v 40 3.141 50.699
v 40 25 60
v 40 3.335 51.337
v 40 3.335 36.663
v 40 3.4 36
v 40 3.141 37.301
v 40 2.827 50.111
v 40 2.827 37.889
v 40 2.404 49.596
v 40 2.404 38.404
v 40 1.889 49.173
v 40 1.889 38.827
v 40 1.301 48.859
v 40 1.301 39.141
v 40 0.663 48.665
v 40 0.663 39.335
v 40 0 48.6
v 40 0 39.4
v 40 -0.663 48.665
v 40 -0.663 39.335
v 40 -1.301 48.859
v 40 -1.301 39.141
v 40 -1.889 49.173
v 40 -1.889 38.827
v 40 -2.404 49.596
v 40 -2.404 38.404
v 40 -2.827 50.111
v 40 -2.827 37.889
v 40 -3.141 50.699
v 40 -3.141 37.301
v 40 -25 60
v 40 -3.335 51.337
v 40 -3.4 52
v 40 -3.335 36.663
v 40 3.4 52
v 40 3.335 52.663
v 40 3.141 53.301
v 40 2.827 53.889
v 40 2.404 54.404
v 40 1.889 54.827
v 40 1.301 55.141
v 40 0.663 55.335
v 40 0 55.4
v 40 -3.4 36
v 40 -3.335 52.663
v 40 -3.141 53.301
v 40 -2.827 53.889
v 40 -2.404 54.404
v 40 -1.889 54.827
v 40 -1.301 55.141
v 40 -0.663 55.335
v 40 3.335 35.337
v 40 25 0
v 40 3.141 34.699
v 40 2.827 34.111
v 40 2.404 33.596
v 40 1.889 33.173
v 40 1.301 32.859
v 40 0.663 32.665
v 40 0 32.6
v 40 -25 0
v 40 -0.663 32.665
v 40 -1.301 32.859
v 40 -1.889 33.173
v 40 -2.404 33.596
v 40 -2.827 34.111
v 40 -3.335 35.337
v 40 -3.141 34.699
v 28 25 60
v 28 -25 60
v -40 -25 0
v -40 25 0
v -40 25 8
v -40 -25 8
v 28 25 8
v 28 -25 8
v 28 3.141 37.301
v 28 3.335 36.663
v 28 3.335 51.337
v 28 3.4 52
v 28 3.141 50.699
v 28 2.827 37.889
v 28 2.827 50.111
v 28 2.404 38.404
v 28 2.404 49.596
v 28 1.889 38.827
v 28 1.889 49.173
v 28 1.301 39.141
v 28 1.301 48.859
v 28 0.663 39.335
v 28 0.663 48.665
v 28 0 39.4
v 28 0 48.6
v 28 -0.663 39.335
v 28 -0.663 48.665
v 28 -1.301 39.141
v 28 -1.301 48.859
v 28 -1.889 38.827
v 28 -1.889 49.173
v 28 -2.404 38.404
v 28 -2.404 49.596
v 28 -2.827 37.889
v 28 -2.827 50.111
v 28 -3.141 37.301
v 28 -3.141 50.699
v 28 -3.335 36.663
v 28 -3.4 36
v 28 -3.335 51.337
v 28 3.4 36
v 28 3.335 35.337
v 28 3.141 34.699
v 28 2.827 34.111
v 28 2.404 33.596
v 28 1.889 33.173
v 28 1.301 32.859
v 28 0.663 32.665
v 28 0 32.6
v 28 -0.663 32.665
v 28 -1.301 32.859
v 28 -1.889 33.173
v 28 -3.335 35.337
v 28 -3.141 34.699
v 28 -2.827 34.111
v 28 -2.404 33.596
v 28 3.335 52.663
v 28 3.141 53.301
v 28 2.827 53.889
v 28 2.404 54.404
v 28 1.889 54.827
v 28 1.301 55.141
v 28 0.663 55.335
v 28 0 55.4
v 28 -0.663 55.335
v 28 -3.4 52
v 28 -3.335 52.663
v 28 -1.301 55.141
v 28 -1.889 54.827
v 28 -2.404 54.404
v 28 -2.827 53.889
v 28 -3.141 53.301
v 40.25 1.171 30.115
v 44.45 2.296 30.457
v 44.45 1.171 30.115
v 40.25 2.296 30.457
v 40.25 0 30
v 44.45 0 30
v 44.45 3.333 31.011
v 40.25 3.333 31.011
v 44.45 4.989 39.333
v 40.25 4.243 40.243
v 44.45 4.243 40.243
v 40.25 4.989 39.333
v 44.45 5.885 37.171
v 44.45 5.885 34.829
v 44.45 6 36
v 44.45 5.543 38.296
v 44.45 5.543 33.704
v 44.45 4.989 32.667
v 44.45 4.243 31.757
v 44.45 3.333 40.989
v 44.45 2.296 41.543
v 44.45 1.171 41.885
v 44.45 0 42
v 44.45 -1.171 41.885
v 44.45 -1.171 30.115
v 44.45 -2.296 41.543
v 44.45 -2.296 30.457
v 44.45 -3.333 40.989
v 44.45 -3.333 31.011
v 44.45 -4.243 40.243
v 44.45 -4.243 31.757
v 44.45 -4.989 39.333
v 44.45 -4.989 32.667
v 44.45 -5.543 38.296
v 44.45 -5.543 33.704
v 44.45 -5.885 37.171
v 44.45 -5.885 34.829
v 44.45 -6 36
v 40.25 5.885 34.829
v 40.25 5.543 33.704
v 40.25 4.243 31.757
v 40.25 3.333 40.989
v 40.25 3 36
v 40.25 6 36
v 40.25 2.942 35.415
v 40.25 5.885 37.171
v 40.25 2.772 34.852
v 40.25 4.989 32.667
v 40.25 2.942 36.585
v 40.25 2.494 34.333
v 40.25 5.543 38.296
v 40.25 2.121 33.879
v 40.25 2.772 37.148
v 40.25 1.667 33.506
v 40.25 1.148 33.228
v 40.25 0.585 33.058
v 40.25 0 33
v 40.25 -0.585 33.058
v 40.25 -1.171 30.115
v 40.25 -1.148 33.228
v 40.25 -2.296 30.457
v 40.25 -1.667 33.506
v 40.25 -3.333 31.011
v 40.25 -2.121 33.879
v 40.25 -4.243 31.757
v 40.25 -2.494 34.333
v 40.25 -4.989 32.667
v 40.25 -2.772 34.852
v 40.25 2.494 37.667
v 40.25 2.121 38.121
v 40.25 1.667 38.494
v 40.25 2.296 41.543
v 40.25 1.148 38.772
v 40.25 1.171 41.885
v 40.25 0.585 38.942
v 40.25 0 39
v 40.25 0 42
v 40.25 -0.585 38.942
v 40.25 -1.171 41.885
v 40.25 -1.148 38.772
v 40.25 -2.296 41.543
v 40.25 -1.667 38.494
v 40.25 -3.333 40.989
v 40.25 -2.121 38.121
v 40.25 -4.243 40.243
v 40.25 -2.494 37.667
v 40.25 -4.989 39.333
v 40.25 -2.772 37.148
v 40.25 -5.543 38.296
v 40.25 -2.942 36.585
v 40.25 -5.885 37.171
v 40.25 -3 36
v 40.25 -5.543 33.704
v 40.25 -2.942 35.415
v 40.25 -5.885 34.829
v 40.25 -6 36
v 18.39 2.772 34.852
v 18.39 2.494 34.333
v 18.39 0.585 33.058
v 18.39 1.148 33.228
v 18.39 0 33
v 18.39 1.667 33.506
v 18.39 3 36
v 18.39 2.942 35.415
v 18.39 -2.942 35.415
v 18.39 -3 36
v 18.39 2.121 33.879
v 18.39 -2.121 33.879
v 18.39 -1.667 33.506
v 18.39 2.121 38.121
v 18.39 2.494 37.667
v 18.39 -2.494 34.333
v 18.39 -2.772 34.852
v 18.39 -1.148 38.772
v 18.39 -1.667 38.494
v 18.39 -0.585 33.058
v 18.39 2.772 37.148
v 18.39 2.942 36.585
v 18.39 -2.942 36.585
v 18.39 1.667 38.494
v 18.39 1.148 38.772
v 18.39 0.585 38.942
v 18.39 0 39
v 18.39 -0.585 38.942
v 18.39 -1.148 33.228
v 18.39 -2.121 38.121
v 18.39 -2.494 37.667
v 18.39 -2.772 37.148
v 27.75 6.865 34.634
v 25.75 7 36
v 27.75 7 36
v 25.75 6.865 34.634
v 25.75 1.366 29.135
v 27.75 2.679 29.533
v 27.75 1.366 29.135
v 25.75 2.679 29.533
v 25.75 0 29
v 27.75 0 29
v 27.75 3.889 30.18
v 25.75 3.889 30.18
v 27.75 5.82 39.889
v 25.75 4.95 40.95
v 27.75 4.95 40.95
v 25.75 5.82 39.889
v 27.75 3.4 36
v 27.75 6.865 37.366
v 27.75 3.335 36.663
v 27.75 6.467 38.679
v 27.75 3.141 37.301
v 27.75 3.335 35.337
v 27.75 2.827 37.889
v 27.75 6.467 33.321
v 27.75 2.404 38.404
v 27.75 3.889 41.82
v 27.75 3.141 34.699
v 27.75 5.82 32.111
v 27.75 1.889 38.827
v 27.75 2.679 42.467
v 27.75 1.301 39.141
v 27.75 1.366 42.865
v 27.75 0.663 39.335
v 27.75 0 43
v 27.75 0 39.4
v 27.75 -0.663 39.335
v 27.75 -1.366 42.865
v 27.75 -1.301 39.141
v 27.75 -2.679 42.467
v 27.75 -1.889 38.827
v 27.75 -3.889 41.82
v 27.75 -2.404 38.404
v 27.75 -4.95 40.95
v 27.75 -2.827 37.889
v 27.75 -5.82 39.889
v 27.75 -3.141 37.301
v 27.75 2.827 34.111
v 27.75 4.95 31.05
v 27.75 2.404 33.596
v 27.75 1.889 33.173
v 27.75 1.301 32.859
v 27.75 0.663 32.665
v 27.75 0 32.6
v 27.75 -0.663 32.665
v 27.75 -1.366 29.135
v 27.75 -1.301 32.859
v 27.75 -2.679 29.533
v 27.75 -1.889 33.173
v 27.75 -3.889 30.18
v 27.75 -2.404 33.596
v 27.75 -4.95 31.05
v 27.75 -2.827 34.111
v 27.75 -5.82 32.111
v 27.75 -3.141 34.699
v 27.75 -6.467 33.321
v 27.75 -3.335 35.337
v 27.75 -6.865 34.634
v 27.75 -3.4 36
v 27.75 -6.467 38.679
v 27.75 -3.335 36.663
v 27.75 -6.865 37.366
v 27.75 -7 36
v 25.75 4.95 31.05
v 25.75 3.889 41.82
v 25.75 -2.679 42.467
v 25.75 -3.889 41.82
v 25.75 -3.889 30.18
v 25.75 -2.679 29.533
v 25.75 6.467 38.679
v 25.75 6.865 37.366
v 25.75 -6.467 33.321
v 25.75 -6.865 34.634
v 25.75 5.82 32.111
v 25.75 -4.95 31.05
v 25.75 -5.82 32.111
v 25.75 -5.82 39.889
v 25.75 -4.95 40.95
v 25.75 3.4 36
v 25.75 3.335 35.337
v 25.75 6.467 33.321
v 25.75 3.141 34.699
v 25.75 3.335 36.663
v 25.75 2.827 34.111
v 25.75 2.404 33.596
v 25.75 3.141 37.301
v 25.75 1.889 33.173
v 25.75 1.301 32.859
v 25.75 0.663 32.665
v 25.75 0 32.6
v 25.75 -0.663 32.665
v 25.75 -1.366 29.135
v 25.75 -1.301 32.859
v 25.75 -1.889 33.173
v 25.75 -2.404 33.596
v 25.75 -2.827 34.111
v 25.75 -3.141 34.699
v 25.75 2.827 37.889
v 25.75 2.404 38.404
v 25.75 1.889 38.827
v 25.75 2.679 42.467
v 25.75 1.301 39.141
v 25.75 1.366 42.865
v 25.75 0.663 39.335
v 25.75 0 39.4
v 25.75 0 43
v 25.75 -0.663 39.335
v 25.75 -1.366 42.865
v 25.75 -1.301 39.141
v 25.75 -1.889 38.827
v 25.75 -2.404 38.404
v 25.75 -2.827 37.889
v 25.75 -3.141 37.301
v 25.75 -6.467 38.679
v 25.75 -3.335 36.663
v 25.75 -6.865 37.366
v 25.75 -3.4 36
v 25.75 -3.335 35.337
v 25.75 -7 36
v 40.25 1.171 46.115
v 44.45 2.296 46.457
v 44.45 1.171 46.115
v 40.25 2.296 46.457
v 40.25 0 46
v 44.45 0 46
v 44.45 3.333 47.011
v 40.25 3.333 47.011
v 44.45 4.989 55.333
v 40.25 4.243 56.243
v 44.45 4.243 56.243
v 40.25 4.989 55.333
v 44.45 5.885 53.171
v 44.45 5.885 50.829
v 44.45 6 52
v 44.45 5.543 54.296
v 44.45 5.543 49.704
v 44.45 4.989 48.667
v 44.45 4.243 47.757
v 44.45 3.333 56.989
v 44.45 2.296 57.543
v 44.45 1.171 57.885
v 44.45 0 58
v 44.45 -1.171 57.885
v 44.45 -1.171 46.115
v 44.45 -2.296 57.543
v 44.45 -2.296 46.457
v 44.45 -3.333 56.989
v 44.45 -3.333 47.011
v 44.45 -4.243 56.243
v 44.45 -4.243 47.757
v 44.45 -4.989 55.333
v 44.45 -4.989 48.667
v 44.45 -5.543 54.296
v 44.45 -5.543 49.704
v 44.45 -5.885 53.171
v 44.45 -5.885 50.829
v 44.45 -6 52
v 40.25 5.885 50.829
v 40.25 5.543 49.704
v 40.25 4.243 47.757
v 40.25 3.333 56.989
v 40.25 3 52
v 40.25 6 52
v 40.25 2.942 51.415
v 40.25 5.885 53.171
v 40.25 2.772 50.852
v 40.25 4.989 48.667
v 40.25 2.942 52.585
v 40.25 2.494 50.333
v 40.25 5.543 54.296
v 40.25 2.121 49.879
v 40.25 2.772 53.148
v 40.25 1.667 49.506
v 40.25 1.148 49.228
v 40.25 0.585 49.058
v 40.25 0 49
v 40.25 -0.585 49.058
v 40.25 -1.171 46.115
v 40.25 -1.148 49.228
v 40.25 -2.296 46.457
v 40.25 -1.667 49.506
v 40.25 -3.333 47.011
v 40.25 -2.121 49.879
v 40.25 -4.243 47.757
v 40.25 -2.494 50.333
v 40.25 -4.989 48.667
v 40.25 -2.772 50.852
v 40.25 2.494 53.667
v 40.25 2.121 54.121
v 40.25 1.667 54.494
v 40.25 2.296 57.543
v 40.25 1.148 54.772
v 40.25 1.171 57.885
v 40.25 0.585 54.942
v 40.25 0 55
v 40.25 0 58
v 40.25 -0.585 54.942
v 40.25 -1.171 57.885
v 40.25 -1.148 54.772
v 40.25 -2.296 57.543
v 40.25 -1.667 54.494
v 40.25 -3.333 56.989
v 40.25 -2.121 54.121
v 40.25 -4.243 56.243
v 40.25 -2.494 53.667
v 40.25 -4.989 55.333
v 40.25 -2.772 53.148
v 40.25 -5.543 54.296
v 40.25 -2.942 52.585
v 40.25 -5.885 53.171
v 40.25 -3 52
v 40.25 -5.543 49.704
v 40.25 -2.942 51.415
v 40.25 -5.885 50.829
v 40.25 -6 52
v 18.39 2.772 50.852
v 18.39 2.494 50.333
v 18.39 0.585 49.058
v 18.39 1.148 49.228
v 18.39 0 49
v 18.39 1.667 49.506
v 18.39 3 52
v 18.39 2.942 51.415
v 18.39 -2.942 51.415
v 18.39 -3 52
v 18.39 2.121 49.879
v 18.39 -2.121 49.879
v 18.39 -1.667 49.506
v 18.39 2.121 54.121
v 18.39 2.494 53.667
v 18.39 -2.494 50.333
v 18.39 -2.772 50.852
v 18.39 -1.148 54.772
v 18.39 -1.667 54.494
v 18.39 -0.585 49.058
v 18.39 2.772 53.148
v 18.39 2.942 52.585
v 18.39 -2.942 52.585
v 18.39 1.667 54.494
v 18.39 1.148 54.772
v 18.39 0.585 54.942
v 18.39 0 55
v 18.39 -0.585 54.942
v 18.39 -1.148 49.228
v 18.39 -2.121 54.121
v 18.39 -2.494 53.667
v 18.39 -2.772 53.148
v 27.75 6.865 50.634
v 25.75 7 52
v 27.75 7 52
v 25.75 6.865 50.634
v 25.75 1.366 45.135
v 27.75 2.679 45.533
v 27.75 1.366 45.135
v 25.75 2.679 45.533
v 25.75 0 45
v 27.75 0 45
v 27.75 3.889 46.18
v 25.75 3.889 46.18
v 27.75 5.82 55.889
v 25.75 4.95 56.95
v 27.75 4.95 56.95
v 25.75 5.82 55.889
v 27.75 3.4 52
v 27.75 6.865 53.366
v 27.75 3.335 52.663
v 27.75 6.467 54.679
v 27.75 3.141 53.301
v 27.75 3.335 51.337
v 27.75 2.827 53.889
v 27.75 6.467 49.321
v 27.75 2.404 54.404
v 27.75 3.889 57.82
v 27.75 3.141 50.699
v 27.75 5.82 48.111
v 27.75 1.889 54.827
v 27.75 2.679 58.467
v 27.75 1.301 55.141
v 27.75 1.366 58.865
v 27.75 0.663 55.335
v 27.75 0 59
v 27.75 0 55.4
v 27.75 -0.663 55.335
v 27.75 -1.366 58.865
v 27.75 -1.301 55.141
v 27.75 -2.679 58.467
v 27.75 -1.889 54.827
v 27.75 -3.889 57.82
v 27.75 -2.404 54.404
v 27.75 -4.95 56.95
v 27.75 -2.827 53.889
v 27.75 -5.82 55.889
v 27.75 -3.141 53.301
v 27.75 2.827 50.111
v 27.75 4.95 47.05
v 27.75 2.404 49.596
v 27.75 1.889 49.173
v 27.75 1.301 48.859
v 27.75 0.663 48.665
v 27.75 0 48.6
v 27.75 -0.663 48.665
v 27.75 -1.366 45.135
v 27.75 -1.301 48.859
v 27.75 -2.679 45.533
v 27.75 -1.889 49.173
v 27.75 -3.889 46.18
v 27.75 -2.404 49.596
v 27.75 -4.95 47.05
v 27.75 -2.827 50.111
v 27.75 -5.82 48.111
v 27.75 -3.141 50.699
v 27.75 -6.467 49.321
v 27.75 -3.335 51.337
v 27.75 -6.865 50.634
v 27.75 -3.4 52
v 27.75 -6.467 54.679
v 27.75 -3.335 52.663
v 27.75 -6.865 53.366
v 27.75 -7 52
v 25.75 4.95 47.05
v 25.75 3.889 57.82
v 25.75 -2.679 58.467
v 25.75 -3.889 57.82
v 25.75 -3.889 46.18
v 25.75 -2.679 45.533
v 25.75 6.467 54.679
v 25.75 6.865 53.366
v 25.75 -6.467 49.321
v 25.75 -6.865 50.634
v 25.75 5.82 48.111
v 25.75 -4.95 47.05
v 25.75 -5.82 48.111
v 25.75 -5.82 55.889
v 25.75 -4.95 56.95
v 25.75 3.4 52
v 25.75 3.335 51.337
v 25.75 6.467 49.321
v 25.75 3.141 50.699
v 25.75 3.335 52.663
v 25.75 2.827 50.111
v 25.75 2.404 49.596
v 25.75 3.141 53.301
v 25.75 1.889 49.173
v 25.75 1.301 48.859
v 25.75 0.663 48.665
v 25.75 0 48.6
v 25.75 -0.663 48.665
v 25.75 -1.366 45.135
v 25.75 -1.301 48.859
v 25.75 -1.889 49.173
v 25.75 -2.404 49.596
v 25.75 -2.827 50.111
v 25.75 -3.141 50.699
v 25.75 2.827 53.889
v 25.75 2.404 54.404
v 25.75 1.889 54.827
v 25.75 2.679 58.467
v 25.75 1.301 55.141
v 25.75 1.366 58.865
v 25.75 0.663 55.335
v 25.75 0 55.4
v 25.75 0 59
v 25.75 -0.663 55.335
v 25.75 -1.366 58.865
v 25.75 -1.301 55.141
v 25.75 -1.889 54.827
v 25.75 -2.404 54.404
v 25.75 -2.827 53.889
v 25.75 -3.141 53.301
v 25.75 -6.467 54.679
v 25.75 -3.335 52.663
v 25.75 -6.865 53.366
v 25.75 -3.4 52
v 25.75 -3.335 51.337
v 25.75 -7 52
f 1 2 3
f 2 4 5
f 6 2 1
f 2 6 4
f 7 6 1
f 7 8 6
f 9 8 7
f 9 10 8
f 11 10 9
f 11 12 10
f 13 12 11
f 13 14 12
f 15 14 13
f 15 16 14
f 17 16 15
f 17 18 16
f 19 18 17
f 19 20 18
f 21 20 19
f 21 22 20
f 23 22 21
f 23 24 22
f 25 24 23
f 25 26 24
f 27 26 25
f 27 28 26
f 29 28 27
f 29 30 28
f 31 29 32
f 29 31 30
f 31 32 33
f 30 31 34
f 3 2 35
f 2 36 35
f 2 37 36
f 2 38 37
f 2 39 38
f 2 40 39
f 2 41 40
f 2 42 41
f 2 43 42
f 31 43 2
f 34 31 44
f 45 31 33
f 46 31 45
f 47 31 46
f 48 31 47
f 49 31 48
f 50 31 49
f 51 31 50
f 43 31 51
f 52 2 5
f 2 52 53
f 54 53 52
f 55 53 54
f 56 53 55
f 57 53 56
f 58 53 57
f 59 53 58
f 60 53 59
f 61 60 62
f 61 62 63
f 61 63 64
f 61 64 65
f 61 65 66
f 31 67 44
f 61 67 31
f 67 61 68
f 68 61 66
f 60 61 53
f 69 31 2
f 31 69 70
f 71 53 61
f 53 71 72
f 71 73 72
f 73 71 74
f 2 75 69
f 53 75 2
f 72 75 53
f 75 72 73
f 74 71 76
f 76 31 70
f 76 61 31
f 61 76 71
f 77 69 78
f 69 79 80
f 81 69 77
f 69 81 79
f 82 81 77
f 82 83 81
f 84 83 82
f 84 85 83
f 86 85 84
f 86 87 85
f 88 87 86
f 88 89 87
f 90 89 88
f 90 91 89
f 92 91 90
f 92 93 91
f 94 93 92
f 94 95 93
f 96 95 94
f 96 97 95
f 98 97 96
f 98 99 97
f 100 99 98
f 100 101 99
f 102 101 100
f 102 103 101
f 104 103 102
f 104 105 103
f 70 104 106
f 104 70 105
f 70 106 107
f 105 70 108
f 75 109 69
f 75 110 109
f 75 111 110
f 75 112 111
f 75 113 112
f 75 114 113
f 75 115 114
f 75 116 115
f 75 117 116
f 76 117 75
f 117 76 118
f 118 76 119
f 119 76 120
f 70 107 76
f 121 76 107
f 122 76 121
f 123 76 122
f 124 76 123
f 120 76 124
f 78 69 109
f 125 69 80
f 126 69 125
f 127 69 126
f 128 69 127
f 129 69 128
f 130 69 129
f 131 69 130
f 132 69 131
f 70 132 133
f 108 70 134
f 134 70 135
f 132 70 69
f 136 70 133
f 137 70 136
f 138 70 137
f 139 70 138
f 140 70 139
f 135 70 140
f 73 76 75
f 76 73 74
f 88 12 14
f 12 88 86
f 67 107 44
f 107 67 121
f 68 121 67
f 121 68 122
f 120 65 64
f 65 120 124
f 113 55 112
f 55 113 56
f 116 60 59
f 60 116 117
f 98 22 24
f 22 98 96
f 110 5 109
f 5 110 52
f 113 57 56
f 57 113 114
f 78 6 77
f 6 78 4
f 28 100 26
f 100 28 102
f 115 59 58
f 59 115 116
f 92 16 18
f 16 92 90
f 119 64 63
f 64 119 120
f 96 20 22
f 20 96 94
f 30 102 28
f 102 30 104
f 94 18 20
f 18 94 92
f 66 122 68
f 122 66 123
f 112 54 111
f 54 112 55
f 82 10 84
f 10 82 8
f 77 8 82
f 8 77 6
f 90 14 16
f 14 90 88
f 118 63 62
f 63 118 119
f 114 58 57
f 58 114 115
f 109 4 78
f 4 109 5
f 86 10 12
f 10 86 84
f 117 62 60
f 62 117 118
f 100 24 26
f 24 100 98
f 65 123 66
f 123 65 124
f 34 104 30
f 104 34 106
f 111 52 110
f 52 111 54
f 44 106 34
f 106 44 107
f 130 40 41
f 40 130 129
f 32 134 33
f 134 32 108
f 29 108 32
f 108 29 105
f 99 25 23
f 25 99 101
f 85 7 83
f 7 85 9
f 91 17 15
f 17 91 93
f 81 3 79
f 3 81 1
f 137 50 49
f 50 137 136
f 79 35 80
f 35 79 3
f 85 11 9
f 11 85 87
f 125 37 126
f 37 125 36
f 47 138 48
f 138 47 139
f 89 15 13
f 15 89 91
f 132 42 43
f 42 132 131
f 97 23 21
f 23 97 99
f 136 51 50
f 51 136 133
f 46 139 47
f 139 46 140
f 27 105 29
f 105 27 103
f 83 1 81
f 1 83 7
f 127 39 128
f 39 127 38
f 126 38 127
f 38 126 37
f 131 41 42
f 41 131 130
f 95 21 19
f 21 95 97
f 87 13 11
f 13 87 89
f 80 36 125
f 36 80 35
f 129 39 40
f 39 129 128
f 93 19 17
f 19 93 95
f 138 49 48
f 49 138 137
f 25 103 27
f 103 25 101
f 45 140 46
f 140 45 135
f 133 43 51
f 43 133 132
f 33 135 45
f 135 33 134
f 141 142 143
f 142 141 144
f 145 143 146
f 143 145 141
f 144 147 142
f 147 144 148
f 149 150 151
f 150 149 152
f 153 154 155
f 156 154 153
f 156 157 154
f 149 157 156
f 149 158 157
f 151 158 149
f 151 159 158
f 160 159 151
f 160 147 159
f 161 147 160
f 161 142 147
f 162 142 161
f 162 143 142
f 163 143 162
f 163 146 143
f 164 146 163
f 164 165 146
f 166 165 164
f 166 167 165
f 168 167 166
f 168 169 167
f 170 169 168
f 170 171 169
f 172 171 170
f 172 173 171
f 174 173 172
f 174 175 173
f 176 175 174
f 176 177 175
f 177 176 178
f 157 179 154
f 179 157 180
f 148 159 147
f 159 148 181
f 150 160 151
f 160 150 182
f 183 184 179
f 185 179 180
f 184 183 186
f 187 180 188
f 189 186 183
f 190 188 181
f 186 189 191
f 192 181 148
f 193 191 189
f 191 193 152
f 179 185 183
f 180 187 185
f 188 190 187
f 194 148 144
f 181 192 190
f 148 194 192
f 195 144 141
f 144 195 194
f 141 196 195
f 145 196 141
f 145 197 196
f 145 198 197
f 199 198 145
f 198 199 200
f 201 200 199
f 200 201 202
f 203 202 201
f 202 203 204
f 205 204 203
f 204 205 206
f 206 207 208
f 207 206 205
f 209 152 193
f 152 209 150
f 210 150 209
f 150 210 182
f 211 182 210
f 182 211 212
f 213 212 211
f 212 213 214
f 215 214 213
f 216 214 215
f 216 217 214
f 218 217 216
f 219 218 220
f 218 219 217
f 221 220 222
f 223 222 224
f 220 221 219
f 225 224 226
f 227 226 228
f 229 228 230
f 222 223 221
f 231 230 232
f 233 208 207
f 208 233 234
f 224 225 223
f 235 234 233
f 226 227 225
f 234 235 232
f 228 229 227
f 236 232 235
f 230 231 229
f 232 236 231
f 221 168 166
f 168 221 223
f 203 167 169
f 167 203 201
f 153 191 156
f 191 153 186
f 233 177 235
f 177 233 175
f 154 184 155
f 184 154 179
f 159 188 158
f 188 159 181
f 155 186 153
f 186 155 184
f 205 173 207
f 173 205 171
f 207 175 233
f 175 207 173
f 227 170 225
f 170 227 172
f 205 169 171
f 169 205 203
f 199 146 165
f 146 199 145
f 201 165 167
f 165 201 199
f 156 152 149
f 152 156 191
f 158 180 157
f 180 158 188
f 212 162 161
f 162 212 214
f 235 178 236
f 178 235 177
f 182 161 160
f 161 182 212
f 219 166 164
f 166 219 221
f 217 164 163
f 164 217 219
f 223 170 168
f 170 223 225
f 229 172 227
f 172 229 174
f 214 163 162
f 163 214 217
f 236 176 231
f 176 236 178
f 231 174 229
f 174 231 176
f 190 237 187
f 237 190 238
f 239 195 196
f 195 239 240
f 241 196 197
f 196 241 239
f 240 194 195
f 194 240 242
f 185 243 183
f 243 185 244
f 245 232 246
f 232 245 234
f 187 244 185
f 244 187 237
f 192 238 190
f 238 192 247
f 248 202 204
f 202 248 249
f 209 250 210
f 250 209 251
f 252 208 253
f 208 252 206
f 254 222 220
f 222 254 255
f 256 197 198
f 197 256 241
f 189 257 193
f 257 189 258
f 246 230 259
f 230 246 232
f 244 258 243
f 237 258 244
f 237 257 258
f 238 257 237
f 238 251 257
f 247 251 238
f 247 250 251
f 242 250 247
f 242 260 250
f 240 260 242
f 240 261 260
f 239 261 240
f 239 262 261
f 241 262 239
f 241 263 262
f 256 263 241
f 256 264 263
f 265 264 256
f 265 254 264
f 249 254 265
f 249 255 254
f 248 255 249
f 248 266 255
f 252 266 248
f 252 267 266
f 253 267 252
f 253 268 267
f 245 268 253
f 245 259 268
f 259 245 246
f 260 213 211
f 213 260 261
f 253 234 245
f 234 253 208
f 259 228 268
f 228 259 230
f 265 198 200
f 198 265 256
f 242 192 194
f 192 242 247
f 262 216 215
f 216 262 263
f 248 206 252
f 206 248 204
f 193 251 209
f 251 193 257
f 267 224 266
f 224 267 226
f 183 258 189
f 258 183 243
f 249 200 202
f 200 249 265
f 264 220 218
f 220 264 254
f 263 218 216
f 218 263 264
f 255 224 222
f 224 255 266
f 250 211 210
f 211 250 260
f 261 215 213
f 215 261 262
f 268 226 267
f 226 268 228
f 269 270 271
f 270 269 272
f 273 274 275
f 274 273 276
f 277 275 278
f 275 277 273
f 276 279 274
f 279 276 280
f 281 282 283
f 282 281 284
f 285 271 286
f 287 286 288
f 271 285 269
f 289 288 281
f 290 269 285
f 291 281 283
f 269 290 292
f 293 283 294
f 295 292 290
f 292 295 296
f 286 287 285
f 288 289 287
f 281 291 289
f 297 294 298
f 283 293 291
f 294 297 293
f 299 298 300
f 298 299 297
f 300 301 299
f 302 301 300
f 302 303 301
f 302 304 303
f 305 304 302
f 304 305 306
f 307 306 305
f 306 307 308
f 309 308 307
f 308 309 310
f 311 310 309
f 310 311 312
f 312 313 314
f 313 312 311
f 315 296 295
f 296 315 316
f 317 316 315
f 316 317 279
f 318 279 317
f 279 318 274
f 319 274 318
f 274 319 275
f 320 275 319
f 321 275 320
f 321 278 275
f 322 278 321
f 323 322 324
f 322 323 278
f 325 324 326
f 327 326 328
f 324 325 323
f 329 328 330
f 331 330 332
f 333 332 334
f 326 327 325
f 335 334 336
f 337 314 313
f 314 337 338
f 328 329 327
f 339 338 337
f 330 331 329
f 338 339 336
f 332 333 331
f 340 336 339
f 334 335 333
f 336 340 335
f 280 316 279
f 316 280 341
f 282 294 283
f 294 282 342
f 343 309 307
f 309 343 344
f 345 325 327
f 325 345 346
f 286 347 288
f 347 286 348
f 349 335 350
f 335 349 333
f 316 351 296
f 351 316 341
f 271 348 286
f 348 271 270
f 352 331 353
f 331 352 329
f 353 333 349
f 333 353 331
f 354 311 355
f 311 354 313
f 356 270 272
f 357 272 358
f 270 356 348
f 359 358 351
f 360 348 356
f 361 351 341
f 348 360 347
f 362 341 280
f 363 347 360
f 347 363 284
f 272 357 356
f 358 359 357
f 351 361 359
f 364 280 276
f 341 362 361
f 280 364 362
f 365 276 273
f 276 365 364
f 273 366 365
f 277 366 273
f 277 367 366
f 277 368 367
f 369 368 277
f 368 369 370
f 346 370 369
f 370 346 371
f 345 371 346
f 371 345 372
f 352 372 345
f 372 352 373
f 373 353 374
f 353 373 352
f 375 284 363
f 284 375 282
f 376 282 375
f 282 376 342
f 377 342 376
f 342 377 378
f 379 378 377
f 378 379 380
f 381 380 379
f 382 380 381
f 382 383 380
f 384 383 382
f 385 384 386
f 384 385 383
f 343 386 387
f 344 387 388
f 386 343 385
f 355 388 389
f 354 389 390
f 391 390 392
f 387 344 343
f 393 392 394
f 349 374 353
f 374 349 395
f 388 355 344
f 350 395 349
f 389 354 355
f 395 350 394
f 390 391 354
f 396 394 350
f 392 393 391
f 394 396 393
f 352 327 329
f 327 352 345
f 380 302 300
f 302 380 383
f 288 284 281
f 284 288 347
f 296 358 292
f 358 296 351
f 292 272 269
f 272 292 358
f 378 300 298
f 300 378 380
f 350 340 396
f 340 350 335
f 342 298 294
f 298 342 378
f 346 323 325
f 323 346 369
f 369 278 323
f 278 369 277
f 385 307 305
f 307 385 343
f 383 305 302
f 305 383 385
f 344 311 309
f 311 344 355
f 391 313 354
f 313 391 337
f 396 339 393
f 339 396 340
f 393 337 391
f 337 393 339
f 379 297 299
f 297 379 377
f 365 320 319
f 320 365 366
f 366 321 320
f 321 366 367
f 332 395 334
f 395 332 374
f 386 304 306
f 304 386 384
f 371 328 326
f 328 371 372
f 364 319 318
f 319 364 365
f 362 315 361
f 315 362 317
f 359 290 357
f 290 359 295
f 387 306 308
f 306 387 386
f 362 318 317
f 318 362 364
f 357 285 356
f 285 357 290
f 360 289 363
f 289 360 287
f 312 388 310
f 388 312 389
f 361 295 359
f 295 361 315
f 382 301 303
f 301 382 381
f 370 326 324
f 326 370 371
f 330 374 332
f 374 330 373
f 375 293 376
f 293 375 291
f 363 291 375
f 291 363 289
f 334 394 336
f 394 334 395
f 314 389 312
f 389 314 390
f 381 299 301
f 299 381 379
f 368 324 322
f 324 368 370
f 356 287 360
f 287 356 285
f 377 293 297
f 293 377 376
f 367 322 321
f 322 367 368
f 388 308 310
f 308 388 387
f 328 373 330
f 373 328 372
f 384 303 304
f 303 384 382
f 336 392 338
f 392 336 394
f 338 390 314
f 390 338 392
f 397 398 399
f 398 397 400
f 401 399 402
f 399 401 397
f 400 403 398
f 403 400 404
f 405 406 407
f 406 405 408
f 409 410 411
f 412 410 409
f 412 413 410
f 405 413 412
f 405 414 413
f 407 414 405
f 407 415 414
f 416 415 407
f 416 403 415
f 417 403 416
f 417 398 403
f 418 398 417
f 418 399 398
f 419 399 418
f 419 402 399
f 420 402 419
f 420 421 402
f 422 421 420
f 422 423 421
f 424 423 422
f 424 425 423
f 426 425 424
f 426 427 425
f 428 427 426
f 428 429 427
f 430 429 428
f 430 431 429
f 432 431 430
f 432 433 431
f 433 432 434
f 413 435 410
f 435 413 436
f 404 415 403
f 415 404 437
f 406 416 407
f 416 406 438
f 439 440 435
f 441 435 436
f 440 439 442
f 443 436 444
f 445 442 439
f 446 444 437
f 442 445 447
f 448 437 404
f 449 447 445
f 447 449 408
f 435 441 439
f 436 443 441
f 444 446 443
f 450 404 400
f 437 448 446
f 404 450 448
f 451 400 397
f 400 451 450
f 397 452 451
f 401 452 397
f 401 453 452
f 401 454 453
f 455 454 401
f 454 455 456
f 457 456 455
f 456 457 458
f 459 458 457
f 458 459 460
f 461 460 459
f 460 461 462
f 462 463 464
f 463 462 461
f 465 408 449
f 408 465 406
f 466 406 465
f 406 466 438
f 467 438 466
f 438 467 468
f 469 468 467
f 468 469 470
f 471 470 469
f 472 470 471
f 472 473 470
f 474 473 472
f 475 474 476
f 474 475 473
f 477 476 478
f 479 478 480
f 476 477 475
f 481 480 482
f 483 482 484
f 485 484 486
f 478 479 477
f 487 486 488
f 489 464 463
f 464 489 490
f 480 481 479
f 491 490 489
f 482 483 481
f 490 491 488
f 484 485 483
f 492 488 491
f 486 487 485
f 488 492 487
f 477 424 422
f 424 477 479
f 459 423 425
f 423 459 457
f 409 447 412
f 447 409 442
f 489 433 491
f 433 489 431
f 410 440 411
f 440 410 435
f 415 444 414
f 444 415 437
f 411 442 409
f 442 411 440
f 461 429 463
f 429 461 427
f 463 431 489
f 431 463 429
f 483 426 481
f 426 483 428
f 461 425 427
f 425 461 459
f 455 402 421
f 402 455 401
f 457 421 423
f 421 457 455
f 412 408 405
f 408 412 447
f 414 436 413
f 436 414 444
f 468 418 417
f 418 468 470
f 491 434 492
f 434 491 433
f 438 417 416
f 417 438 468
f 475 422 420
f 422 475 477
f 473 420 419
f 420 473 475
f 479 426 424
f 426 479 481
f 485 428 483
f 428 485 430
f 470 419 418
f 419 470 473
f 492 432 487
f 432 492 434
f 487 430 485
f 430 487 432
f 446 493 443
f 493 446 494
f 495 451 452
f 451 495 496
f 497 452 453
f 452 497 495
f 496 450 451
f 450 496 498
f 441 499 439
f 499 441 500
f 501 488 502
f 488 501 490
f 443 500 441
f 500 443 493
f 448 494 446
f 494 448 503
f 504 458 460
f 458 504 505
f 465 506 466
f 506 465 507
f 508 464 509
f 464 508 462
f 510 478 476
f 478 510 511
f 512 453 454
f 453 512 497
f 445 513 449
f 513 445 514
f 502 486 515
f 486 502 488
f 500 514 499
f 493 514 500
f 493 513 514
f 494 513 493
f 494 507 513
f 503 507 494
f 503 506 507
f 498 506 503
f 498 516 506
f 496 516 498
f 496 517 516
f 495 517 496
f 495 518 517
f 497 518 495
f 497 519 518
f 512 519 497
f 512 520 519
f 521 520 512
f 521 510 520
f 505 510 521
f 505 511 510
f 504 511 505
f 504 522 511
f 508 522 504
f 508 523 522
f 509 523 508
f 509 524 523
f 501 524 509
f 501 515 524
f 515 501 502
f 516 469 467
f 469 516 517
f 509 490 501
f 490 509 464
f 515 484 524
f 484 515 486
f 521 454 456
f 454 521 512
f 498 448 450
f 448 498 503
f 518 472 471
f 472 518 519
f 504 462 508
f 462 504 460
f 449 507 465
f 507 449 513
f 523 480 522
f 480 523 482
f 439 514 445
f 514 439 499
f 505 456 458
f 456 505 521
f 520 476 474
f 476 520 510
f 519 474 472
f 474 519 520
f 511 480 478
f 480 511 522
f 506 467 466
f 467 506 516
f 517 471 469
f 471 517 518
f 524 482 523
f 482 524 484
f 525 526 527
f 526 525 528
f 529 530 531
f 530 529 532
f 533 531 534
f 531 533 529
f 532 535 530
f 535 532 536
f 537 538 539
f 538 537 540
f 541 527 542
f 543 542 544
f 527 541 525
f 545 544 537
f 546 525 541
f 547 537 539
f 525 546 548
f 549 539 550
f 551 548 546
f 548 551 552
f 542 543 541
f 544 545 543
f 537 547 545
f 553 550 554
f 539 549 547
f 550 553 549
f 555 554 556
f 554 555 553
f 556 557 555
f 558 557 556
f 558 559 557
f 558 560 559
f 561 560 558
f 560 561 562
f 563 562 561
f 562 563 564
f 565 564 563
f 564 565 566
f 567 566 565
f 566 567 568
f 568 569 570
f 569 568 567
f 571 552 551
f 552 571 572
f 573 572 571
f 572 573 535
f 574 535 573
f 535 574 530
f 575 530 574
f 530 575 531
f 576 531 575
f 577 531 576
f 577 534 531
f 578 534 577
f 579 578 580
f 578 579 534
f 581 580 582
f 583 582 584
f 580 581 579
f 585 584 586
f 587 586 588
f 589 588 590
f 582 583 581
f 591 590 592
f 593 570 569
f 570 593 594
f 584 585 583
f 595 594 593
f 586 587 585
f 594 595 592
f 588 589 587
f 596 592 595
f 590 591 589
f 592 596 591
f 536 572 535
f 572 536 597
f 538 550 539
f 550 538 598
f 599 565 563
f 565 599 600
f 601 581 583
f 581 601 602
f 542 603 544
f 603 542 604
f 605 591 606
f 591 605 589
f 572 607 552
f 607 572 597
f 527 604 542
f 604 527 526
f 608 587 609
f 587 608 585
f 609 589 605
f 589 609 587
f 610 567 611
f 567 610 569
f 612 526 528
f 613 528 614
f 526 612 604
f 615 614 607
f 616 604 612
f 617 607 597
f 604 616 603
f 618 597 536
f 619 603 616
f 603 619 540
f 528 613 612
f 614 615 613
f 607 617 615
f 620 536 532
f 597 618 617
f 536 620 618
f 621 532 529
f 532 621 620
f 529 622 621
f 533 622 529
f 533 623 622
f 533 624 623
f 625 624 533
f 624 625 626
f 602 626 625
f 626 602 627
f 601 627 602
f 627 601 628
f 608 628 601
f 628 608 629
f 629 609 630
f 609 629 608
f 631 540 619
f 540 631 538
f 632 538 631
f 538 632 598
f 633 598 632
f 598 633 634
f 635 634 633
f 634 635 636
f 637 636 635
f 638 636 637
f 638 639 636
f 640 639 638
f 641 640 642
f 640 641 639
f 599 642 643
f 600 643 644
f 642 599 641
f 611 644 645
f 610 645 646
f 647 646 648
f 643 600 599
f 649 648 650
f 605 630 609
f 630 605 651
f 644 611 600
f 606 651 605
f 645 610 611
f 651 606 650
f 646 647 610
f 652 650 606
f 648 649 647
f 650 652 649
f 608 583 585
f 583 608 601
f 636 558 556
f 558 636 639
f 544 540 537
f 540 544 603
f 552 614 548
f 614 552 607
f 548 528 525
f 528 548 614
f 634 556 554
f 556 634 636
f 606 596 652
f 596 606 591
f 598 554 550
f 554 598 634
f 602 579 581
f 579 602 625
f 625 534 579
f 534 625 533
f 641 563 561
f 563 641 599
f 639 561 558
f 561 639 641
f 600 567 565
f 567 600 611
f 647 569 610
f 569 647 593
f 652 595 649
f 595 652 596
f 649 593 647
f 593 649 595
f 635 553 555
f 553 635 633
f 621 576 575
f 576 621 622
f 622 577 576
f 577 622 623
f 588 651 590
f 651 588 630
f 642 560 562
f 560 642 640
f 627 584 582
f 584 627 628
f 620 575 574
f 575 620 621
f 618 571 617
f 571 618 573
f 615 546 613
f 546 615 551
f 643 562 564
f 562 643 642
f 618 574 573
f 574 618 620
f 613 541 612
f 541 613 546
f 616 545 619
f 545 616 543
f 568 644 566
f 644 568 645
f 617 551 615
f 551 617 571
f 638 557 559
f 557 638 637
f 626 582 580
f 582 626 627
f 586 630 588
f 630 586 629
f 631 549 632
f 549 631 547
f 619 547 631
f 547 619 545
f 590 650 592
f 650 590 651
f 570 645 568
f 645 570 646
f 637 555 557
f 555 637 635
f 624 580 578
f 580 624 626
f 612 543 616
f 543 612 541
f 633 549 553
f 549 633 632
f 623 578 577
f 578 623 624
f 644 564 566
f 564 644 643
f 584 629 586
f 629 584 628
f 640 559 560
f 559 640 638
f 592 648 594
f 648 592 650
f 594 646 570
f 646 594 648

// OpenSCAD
$fn = 32;

// ------------------------------------------------------------------------
// Bolted bracket: 80 x 50 mm bracket with 2 bolt joints
// Every part is its own module, assembly() places them once.
// ------------------------------------------------------------------------

// --- part 1 ---
module bracket() {
  difference() {
    translate([-40, -25, 0]) cube([80, 50, 60]);
    translate([-41, -26, 8]) cube([69, 52, 53]);
    translate([34, 0, 36]) rotate([0, 90, 0]) cylinder(h = 14, d = 6.8, center = true);
    translate([34, 0, 52]) rotate([0, 90, 0]) cylinder(h = 14, d = 6.8, center = true);
  }
}

// --- part 2 ---
module bolt1() {
  cylinder(h = 4.2, d = 12);
  translate([0, 0, -21.86]) cylinder(h = 21.86, d = 6);
}

// --- part 3 ---
module washer1() {
  difference() {
      translate([0, 0, 0]) cylinder(h = 2, d = 14);
      translate([0, 0, -1]) cylinder(h = 4, d = 6.8);
    }
}

// --- part 4 ---
module bolt2() {
  cylinder(h = 4.2, d = 12);
  translate([0, 0, -21.86]) cylinder(h = 21.86, d = 6);
}

// --- part 5 ---
module washer2() {
  difference() {
      translate([0, 0, 0]) cylinder(h = 2, d = 14);
      translate([0, 0, -1]) cylinder(h = 4, d = 6.8);
    }
}

// --- assembly ---
module assembly() {
  translate([0, 0, 0]) rotate([0, 0, 0]) bracket();
  translate([40.25, 0, 36]) rotate([0, 90, 0]) bolt1();
  translate([25.75, 0, 36]) rotate([0, 90, 0]) washer1();
  translate([40.25, 0, 52]) rotate([0, 90, 0]) bolt2();
  translate([25.75, 0, 52]) rotate([0, 90, 0]) washer2();
}

assembly();
